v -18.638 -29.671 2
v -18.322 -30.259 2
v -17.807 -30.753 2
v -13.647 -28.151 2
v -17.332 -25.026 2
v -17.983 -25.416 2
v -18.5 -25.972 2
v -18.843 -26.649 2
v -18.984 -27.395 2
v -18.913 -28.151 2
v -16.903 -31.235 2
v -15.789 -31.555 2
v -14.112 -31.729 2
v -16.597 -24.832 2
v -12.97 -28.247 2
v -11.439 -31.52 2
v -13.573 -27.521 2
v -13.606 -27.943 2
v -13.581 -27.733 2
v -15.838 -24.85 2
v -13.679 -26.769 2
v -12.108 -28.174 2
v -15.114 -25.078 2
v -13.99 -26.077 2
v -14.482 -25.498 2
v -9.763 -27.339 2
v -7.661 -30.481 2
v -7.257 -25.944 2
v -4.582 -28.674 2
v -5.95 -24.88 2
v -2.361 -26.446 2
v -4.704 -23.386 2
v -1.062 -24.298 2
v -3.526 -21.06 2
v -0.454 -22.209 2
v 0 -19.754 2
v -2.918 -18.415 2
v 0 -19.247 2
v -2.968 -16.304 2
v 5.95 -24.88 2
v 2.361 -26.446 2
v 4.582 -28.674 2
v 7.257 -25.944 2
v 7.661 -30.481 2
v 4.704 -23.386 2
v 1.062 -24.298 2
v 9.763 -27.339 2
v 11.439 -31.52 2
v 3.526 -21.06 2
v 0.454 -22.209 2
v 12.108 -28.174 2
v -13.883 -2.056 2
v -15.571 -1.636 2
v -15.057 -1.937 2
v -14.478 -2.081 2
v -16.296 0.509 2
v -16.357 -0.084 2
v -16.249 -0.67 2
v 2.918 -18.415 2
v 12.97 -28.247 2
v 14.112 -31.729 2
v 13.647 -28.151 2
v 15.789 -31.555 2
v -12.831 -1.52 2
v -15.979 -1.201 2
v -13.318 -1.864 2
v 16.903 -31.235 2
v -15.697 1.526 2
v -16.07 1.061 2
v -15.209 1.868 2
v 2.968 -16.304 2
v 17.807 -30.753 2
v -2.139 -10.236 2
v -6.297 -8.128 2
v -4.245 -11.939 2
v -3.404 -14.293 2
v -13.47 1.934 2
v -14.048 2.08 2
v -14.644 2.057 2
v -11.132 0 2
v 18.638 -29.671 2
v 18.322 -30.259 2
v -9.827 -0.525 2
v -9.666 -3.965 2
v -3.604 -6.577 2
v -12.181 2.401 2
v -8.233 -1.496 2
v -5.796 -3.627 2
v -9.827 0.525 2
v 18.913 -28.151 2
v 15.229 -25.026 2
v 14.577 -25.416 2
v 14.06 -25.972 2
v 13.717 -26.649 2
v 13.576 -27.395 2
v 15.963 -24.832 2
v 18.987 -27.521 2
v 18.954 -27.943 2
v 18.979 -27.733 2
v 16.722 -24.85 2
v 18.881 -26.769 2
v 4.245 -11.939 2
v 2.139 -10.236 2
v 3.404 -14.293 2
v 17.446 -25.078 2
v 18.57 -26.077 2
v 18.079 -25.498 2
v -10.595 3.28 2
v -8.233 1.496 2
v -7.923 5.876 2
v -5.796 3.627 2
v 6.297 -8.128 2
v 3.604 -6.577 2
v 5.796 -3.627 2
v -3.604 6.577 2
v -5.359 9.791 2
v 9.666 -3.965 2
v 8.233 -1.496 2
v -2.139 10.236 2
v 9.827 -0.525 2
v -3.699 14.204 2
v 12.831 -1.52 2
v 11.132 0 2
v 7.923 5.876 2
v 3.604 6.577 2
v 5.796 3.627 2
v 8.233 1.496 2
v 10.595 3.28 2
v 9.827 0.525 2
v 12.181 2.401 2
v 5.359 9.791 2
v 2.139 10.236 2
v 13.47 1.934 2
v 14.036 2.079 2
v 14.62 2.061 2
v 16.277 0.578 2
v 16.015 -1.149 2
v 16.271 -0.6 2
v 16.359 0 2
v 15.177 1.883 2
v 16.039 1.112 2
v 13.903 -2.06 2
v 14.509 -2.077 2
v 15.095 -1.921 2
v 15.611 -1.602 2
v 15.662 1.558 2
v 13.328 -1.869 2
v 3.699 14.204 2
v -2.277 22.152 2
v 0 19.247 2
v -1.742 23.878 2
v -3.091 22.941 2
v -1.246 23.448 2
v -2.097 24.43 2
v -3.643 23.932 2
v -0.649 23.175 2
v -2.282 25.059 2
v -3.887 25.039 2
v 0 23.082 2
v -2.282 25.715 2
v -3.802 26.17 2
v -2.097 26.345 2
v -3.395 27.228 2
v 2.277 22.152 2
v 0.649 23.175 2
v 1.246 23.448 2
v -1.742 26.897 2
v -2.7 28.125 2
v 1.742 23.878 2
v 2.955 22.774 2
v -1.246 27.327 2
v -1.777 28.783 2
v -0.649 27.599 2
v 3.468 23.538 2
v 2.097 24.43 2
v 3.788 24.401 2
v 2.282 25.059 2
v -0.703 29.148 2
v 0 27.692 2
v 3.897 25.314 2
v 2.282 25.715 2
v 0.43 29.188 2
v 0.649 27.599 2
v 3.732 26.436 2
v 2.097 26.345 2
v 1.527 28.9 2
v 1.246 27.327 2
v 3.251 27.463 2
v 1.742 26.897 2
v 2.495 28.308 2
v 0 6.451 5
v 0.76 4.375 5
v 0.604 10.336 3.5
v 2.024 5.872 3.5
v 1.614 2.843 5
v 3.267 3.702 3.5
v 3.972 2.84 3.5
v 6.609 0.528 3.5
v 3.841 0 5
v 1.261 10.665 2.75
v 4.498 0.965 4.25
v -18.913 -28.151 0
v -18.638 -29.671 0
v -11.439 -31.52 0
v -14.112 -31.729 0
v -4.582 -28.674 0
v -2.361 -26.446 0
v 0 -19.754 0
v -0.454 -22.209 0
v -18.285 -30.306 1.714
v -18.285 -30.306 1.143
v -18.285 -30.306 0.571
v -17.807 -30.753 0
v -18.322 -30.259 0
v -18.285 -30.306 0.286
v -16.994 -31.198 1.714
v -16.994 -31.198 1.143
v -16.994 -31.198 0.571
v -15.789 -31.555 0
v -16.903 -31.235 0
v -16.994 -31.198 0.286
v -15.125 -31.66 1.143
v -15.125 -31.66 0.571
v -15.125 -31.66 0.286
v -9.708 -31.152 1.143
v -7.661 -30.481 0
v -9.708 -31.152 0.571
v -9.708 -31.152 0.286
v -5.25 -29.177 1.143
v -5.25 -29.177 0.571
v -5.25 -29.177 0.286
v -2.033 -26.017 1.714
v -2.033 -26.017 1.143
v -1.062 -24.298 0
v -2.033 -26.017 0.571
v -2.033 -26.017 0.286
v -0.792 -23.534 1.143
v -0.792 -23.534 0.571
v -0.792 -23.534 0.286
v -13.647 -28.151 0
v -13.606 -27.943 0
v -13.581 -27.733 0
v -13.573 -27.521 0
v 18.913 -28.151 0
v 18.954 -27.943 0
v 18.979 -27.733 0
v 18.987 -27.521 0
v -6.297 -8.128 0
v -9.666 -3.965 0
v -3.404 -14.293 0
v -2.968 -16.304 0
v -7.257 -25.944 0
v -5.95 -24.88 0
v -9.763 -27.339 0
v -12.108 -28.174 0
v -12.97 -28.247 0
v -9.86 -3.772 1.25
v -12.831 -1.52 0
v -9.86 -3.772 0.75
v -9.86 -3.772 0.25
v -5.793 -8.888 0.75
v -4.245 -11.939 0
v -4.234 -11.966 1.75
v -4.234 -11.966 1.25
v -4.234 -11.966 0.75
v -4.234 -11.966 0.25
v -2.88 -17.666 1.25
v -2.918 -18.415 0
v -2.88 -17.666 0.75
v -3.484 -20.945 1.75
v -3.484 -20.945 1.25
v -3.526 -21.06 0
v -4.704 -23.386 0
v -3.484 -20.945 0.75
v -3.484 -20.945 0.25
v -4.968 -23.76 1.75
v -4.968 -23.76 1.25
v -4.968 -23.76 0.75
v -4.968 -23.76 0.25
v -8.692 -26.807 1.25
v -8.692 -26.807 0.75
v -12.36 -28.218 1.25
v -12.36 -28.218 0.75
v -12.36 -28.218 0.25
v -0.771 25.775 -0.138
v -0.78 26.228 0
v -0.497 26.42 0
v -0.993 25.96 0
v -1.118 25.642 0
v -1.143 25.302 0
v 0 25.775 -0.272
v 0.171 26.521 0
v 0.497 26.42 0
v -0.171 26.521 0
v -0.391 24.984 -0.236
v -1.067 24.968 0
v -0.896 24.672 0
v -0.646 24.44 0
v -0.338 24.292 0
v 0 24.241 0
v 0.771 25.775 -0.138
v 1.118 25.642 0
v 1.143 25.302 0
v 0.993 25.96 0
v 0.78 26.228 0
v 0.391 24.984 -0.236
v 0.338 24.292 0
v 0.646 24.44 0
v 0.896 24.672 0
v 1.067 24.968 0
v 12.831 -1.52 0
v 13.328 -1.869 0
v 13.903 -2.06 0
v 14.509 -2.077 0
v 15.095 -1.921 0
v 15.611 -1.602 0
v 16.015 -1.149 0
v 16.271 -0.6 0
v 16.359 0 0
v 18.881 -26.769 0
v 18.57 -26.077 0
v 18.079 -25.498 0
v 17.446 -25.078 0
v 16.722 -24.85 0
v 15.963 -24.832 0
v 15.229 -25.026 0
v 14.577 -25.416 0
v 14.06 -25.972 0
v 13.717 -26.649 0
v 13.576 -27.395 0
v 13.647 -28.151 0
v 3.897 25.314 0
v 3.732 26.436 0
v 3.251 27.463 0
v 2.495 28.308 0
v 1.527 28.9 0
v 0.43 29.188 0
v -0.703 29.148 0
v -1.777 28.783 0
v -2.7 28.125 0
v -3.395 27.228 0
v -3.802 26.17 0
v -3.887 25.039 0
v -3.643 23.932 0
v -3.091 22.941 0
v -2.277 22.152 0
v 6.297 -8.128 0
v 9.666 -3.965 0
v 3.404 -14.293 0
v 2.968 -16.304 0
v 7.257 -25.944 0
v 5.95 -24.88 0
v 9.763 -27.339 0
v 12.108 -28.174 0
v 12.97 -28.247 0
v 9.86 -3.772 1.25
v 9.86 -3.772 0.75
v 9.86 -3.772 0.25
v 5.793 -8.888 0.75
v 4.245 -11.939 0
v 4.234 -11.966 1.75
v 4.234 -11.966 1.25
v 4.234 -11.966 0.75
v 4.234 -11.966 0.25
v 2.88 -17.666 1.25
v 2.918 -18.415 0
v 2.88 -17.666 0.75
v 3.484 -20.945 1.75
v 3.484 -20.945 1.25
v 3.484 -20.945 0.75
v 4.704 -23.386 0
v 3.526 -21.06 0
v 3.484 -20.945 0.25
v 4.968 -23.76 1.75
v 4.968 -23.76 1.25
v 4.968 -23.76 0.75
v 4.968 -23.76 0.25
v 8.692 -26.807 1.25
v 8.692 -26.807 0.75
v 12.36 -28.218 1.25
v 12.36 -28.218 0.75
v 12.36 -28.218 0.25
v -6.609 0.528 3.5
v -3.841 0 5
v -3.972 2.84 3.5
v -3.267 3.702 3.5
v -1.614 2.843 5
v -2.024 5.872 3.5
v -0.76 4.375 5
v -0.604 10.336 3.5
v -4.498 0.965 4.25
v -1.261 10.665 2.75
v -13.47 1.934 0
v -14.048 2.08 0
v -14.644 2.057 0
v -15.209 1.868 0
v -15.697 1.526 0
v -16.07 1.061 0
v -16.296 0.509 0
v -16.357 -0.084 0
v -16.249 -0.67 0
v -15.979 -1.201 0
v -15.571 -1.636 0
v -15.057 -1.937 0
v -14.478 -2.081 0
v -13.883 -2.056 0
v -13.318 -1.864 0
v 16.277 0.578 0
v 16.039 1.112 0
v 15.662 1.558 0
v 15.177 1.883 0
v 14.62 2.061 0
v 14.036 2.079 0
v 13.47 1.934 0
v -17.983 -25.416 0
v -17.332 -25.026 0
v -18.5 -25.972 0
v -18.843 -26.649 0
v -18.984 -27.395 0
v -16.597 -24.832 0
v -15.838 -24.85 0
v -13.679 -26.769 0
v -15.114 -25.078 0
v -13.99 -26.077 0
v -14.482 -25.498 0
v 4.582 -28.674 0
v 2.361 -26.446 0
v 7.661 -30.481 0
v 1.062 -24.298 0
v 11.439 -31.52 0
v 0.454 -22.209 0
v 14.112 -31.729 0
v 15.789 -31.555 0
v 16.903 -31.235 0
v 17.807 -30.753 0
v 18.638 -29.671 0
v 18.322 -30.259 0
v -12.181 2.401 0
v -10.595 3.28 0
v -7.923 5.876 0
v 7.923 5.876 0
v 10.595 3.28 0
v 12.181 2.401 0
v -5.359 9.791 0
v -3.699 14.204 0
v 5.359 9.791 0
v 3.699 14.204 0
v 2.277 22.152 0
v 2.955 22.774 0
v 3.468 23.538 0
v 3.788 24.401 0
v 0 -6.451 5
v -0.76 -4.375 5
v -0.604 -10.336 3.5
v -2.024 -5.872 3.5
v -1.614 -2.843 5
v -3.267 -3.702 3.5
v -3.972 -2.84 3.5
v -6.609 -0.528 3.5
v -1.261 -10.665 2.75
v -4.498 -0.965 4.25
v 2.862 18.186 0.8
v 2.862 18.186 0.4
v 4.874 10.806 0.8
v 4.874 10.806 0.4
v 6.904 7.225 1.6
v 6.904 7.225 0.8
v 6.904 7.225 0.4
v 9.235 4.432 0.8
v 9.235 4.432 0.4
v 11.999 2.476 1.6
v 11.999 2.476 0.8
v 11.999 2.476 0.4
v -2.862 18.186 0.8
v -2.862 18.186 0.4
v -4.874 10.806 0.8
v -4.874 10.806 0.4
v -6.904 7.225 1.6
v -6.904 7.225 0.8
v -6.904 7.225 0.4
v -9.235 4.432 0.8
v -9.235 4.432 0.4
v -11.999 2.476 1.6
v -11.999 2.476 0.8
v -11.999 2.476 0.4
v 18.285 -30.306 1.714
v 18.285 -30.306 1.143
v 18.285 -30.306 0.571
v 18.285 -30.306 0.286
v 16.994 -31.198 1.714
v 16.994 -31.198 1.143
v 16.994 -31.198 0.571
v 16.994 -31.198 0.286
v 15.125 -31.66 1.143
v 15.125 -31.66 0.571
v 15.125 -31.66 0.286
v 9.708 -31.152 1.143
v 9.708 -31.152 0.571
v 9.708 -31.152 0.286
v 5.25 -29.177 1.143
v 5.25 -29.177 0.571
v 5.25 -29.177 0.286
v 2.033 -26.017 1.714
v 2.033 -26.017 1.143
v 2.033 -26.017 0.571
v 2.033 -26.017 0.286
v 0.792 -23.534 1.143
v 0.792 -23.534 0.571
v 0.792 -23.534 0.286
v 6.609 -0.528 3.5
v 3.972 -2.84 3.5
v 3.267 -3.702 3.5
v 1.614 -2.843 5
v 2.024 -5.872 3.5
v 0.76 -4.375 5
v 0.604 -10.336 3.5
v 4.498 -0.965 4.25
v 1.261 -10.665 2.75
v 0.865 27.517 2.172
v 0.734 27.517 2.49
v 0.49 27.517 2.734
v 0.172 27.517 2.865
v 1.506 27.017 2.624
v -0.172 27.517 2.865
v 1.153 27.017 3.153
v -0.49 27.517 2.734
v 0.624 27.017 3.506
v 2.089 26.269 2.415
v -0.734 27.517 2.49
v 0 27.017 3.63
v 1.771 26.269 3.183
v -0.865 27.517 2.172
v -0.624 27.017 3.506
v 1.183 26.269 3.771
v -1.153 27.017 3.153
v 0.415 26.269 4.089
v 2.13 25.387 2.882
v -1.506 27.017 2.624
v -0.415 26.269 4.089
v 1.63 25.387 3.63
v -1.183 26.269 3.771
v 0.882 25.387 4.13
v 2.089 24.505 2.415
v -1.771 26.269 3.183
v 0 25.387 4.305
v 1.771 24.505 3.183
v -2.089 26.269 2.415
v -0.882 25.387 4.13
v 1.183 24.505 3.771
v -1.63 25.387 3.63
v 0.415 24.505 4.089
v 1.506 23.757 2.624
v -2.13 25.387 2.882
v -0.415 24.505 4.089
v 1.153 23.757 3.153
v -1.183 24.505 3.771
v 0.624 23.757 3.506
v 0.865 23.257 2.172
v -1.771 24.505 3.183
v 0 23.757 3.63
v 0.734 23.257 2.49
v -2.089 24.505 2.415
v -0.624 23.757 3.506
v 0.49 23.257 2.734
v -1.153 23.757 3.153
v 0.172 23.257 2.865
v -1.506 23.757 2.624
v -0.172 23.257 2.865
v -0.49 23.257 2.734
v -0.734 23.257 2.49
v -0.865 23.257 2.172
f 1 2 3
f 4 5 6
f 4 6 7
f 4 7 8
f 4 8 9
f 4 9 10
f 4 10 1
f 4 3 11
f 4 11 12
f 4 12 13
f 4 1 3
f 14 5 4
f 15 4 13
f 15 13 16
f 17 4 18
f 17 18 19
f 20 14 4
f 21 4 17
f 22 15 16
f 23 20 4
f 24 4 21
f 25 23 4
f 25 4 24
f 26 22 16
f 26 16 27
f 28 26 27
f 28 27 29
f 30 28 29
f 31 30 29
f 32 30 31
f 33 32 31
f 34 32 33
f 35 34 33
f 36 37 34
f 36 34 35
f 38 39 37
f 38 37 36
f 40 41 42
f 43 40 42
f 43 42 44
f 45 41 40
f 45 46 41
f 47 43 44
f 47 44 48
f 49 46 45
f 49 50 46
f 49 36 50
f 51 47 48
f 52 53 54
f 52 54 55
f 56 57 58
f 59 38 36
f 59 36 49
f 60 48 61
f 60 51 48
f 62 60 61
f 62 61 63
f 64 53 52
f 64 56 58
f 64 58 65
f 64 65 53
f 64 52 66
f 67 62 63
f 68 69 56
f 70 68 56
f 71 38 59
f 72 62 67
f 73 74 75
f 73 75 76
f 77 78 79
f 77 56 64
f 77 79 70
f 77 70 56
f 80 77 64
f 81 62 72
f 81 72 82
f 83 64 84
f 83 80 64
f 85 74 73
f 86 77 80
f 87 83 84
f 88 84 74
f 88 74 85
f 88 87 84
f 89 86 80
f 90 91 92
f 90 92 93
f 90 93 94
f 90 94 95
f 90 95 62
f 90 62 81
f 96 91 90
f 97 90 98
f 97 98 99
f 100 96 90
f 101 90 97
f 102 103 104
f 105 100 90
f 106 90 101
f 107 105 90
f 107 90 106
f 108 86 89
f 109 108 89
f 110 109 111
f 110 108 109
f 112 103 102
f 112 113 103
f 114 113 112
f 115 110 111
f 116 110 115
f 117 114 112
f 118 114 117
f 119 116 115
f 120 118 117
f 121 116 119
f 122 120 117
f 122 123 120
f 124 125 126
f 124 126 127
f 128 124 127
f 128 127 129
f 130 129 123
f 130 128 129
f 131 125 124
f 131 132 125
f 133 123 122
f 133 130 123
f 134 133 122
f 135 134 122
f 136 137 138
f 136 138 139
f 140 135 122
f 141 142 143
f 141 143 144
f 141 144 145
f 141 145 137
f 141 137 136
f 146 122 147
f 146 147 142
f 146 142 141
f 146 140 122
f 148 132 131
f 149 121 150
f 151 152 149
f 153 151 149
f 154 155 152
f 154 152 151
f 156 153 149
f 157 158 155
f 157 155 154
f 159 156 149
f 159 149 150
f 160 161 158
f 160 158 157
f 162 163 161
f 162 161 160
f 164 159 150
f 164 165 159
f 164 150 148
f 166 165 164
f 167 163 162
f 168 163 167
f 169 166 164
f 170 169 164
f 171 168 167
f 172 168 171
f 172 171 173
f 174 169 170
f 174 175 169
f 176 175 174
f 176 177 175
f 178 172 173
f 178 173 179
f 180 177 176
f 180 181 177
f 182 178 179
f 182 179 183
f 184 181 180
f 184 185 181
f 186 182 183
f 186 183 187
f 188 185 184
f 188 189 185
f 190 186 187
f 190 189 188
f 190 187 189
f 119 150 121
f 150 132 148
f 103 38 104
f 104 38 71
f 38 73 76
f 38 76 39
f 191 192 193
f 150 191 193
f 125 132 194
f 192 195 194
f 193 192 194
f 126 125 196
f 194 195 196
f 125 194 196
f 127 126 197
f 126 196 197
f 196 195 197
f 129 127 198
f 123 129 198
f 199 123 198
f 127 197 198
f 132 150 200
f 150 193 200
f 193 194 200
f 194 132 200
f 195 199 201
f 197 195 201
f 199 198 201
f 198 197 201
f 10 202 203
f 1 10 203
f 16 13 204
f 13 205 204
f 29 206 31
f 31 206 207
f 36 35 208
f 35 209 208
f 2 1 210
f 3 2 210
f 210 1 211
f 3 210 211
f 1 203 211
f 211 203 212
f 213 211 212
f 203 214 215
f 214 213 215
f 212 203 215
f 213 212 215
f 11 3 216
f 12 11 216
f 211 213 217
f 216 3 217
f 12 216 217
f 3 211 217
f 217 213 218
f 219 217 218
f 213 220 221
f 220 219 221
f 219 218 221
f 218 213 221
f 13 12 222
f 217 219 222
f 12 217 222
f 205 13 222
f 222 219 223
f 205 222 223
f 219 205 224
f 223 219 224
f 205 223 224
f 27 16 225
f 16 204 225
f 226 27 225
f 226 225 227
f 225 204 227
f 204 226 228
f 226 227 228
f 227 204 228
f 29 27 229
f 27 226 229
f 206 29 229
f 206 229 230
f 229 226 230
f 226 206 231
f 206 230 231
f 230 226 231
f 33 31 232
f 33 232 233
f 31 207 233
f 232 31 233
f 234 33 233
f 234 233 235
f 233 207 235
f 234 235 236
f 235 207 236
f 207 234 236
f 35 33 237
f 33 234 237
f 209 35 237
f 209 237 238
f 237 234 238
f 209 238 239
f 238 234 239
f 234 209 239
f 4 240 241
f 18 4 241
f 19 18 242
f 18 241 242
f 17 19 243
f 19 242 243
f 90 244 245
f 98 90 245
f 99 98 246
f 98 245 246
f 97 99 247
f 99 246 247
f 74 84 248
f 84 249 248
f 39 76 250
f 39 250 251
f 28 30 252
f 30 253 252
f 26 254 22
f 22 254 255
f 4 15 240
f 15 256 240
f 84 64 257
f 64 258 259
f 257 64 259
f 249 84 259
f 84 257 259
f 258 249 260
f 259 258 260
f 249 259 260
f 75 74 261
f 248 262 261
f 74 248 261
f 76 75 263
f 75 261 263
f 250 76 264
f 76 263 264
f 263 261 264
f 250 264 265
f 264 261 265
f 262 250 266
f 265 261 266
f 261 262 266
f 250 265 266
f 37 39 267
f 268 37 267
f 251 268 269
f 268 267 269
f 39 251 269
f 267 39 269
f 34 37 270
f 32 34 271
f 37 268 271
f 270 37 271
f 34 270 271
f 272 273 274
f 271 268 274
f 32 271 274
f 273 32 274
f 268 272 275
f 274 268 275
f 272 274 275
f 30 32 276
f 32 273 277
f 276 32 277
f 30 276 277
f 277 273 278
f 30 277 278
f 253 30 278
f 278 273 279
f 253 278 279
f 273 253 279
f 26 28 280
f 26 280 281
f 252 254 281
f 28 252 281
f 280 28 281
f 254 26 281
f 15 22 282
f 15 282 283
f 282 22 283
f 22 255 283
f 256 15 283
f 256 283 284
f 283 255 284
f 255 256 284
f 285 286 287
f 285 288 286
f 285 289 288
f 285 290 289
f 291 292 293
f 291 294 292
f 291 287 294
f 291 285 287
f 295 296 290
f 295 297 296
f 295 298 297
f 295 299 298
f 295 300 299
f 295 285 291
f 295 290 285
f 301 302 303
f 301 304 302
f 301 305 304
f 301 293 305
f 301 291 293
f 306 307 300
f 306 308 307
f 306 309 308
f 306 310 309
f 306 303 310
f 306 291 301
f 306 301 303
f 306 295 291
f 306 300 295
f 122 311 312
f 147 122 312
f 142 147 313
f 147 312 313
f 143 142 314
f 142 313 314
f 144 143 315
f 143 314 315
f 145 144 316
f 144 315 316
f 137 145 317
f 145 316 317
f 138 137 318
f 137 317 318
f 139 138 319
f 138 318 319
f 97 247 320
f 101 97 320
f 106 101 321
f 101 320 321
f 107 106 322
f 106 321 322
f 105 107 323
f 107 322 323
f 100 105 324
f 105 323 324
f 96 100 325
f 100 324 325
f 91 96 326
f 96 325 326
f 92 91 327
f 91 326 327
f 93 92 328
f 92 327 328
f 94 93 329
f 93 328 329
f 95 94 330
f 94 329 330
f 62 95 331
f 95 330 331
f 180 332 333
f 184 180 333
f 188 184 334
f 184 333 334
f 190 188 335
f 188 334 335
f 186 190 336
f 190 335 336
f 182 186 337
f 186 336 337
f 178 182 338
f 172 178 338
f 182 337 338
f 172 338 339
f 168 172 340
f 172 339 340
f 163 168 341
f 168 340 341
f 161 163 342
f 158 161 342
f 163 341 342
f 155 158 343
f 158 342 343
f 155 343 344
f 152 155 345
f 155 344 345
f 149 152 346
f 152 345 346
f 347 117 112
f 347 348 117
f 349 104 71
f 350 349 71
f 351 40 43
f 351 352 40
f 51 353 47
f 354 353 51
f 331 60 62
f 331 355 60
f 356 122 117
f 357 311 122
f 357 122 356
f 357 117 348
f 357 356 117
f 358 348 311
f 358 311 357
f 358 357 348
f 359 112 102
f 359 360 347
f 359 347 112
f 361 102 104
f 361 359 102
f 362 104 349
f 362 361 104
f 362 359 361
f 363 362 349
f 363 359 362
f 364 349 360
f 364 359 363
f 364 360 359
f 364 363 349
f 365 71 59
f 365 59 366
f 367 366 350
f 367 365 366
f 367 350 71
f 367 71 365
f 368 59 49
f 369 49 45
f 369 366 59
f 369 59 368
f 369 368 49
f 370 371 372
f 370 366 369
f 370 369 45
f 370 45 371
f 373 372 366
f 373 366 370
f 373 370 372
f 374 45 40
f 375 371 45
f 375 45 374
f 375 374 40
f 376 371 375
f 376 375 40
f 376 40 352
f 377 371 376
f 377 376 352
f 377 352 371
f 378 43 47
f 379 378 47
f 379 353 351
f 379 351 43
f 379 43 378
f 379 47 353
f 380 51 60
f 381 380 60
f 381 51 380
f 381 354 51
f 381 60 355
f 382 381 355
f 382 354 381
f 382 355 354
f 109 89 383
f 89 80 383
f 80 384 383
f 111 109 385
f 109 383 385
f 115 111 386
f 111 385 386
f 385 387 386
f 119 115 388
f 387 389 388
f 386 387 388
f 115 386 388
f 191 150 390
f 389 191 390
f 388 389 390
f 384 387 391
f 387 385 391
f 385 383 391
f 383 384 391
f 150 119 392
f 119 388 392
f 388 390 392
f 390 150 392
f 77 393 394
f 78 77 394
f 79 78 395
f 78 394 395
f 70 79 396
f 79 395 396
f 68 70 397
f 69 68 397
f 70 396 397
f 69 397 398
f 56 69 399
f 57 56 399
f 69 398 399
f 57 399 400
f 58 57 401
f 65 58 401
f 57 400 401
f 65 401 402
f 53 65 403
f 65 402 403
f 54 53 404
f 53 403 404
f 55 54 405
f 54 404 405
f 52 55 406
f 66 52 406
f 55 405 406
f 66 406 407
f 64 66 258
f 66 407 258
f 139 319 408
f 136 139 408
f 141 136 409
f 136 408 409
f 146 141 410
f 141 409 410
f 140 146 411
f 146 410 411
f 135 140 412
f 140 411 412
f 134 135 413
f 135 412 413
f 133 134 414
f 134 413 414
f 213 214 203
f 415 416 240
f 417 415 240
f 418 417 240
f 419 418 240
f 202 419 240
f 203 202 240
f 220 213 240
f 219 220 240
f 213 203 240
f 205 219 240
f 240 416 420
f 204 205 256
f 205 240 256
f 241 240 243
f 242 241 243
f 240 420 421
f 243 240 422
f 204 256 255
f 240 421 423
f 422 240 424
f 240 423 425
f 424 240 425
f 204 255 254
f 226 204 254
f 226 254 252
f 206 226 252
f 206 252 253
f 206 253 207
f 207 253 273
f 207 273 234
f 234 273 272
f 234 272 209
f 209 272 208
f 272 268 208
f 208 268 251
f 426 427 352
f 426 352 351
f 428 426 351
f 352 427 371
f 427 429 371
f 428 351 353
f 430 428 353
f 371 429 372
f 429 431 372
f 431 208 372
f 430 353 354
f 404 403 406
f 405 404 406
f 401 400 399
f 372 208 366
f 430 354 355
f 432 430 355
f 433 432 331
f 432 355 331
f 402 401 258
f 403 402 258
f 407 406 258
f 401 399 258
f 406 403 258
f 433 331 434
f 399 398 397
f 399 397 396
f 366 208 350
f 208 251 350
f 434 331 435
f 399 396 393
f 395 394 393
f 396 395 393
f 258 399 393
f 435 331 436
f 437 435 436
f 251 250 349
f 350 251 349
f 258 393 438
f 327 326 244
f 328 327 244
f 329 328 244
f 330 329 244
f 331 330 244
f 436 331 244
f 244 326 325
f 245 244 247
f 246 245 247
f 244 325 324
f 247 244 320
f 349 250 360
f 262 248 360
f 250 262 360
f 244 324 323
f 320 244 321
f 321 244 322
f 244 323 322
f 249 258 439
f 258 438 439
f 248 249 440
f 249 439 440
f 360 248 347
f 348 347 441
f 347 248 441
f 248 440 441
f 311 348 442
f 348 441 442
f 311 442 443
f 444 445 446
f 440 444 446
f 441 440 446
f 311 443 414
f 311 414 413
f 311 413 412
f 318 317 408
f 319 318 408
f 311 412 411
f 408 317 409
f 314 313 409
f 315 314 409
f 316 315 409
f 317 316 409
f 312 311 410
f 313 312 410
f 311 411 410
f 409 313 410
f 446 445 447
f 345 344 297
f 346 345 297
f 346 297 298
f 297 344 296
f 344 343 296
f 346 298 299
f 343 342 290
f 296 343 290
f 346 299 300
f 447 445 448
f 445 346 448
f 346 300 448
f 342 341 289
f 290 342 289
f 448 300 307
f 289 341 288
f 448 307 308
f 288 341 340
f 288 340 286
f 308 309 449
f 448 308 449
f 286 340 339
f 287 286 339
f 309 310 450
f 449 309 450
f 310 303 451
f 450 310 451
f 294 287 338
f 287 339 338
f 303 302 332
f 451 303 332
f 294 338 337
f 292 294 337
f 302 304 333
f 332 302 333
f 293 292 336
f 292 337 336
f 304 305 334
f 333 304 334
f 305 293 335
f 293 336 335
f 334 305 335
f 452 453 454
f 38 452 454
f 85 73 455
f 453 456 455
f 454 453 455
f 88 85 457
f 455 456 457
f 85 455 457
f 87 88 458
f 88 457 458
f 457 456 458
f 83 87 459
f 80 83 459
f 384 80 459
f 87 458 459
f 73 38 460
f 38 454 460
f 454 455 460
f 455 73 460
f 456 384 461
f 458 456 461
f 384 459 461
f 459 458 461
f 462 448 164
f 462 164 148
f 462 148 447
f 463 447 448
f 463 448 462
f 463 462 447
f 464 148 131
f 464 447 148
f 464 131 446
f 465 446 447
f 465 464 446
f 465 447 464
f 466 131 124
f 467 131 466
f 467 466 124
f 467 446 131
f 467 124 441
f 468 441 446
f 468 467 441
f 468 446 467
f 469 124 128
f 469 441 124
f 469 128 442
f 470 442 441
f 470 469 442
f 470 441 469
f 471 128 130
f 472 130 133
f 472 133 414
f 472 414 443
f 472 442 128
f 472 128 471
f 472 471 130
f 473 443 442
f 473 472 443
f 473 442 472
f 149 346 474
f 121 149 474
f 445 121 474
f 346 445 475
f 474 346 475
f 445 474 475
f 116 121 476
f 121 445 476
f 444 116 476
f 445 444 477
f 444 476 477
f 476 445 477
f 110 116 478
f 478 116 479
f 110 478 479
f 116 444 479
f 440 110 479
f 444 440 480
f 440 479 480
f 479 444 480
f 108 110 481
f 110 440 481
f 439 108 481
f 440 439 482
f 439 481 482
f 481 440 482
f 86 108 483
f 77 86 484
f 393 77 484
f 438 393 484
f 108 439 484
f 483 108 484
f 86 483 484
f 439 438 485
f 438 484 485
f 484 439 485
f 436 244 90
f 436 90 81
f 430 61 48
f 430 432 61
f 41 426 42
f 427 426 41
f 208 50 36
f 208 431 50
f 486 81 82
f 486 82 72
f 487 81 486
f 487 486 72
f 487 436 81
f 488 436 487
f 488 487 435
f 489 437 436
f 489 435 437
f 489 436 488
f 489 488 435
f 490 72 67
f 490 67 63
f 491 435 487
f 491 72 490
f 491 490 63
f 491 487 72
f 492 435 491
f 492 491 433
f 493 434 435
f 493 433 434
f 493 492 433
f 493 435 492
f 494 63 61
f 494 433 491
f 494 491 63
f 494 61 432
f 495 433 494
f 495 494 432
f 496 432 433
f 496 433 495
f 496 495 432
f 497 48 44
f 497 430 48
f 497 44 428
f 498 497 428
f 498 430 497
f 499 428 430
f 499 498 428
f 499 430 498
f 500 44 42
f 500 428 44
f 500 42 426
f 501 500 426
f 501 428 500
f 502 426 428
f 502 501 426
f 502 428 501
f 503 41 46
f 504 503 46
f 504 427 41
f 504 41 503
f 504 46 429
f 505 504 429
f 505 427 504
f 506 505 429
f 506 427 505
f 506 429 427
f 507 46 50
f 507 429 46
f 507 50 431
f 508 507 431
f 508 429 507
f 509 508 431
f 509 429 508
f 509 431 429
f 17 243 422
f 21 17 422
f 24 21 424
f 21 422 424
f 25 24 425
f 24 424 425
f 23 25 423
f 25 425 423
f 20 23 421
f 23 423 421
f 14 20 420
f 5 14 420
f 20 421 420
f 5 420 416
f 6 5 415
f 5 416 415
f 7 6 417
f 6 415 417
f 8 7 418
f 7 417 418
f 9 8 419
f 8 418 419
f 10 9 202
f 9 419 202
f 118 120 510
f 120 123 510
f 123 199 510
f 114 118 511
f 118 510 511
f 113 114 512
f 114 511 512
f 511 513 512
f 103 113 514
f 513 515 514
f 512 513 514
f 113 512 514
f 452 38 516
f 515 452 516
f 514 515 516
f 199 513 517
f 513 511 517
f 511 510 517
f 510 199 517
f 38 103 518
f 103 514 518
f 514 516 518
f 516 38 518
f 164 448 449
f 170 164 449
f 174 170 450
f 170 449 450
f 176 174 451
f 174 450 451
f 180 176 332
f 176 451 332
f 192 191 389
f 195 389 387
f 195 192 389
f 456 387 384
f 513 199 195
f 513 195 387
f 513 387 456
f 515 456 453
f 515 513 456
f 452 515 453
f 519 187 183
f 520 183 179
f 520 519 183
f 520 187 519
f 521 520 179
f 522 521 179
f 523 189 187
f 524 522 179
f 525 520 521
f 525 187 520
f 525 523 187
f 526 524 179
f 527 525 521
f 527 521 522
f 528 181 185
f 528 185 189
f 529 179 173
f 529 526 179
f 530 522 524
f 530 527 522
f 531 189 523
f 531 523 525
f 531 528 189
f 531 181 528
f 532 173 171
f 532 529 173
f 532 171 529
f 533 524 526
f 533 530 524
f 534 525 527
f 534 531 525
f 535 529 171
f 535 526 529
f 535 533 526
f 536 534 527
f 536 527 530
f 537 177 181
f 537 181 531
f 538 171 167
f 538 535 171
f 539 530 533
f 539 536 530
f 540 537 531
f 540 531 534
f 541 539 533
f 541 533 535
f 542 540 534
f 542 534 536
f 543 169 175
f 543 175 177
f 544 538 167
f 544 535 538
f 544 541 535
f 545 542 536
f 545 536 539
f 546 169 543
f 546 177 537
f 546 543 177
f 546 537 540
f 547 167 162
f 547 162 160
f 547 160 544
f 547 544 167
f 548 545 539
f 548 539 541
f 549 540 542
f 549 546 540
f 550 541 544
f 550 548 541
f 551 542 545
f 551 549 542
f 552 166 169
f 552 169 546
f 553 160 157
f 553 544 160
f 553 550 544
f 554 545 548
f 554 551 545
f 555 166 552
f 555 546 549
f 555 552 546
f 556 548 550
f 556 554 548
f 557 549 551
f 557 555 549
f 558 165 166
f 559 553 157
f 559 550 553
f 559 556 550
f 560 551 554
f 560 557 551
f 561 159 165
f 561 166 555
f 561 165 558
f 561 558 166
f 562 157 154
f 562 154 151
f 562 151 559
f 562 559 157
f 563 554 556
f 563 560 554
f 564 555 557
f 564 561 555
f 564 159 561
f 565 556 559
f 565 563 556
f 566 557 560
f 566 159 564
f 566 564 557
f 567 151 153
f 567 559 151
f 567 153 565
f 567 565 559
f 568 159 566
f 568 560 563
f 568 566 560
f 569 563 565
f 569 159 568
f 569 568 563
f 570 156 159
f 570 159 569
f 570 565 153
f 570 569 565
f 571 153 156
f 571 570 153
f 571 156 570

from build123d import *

# Parameters (mm, degrees)
F1_DEPTH = 2


with BuildPart() as f1:
    # F0 (on Top) → F1 (new body)
    with BuildSketch(Plane.XY):
        with BuildLine():
            ThreePointArc((2.276998472, 22.1518947859), (3.4684353098, 23.5377967667), (3.8970014846, 25.3144726157))
            ThreePointArc((3.8970014846, 25.3144726157), (-1.776675849, 28.7829079255), (-2.276998472, 22.1518947859))
            ThreePointArc((-2.276998472, 22.1518947859), (0, 21.4174711311), (2.276998472, 22.1518947859))
        make_face()
        with BuildLine():
            ThreePointArc((2.276998472, 22.1518947859), (0, 21.4174711311), (-2.276998472, 22.1518947859))
            add(Edge.make_bspline(
                [(-2.276998472, 22.1518947859), (-2.43209236, 20.9439660702), (-2.8343734971, 18.0367414787), (-4.2933644234, 10.5944689547), (-8.8445045466, 4.3730220087), (-11.8033781804, 2.4111709095), (-13.0773430388, 2.1147085966), (-13.4704228381, 1.9336606815)],
                knots=[0, 0, 0, 0, 0.1881889821, 0.4481491748, 0.7093502782, 0.8822992894, 1, 1, 1, 1], degree=3))
            ThreePointArc((-13.4704228381, 1.9336606815), (-12.5293900739, 1.1634963246), (-12.1758761383, 0))
            ThreePointArc((-12.1758761383, 0), (-12.3466918638, -0.827839696), (-12.831236523, -1.520452898))
            add(Edge.make_bspline(
                [(-12.831236523, -1.520452898), (-11.8842823807, -2.1213598077), (-9.681883743, -3.5201856027), (-5.5850911002, -8.9136286048), (-4.2143400839, -11.8630451312), (-2.0601001418, -17.7294924846), (-4.5364296122, -24.1123047819), (-8.3995913538, -26.8506466614), (-12.2431889954, -28.4193492404), (-13.2719842293, -28.2231302019), (-13.6472955259, -28.1513297683)],
                knots=[0, 0, 0, 0, 0.116209539, 0.2700802769, 0.3818783209, 0.5275533776, 0.680317664, 0.8123481439, 0.9316634476, 1, 1, 1, 1], degree=3))
            ThreePointArc((-13.6472955259, -28.1513297683), (-16.2800811231, -30.2281833728), (-18.9128667203, -28.1513297683))
            add(Edge.make_bspline(
                [(-18.9128667203, -28.1513297683), (-18.8376863203, -28.9308803678), (-18.6694510212, -30.675323445), (-14.9675114924, -32.0694588166), (-9.6030872532, -31.3634199504), (-5.1754016498, -29.5295339957), (-1.8867493119, -26.1259118959), (-0.6530666103, -23.5893108184), (-0.2293292758, -21.1004769068), (0, -19.7535045445)],
                knots=[0, 0, 0, 0, 0.1097624217, 0.2456213834, 0.4165331309, 0.578325558, 0.7339136873, 0.8559924358, 1, 1, 1, 1], degree=3))
            add(Edge.make_bspline(
                [(18.9128667203, -28.1513297683), (18.8376863203, -28.9308803678), (18.6694510212, -30.675323445), (14.9675114924, -32.0694588166), (9.6030872532, -31.3634199504), (5.1754016498, -29.5295339957), (1.8867493119, -26.1259118959), (0.6530666103, -23.5893108184), (0.2293292758, -21.1004769068), (0, -19.7535045445)],
                knots=[0, 0, 0, 0, 0.1097624217, 0.2456213834, 0.4165331309, 0.578325558, 0.7339136873, 0.8559924358, 1, 1, 1, 1], degree=3))
            ThreePointArc((18.9128667203, -28.1513297683), (16.2800811231, -30.2281833728), (13.6472955259, -28.1513297683))
            add(Edge.make_bspline(
                [(12.831236523, -1.520452898), (11.8842823807, -2.1213598077), (9.681883743, -3.5201856027), (5.5850911002, -8.9136286048), (4.2143400839, -11.8630451312), (2.0601001418, -17.7294924846), (4.5364296122, -24.1123047819), (8.3995913538, -26.8506466614), (12.2431889954, -28.4193492404), (13.2719842293, -28.2231302019), (13.6472955259, -28.1513297683)],
                knots=[0, 0, 0, 0, 0.116209539, 0.2700802769, 0.3818783209, 0.5275533776, 0.680317664, 0.8123481439, 0.9316634476, 1, 1, 1, 1], degree=3))
            ThreePointArc((12.831236523, -1.520452898), (12.2107910898, 0.3805587398), (13.4704228381, 1.9336606815))
            add(Edge.make_bspline(
                [(2.276998472, 22.1518947859), (2.43209236, 20.9439660702), (2.8343734971, 18.0367414787), (4.2933644234, 10.5944689547), (8.8445045466, 4.3730220087), (11.8033781804, 2.4111709095), (13.0773430388, 2.1147085966), (13.4704228381, 1.9336606815)],
                knots=[0, 0, 0, 0, 0.1881889821, 0.4481491748, 0.7093502782, 0.8822992894, 1, 1, 1, 1], degree=3))
        make_face()
        with BuildLine():
            ThreePointArc((-12.1758761383, 0), (-12.5293900739, 1.1634963246), (-13.4704228381, 1.9336606815))
            ThreePointArc((-13.4704228381, 1.9336606815), (-16.3238112841, -0.3805587398), (-12.831236523, -1.520452898))
            ThreePointArc((-12.831236523, -1.520452898), (-12.3466918638, -0.827839696), (-12.1758761383, 0))
        make_face()
        with BuildLine():
            ThreePointArc((16.3587262356, 0), (15.4307975115, 1.737911113), (13.4704228381, 1.9336606815))
            ThreePointArc((13.4704228381, 1.9336606815), (12.2107910898, 0.3805587398), (12.831236523, -1.520452898))
            ThreePointArc((12.831236523, -1.520452898), (15.0951408829, -1.9206093231), (16.3587262356, 0))
        make_face()
        with BuildLine():
            ThreePointArc((-18.9128667203, -28.1513297683), (-16.2800811231, -30.2281833728), (-13.6472955259, -28.1513297683))
            ThreePointArc((-13.6472955259, -28.1513297683), (-13.5915554401, -27.8383489621), (-13.5728896121, -27.5209918618))
            ThreePointArc((-13.5728896121, -27.5209918618), (-16.5974382234, -24.8324661788), (-18.9128667203, -28.1513297683))
        make_face()
        with BuildLine():
            ThreePointArc((18.9872726341, -27.5209918618), (15.9627240228, -24.8324661788), (13.6472955259, -28.1513297683))
            ThreePointArc((13.6472955259, -28.1513297683), (16.2800811231, -30.2281833728), (18.9128667203, -28.1513297683))
            ThreePointArc((18.9128667203, -28.1513297683), (18.9686068061, -27.8383489621), (18.9872726341, -27.5209918618))
        make_face()
    extrude(amount=F1_DEPTH)

    # F2 (on face) → F5 section 0
    with BuildSketch(Plane.XY.offset(2)):
        with BuildLine():
            add(Edge.make_bspline(
                [(0, 19.2468184978), (0.6301650981, 16.2510379584), (1.7928287138, 10.723780032), (4.0098790345, 4.9325918727), (8.7986333903, 0.8351177225), (10.4822360359, 0.2324566501), (11.1316302791, 0)],
                knots=[0, 0, 0, 0, 0.3137777977, 0.578924523, 0.8375840098, 1, 1, 1, 1], degree=3))
            add(Edge.make_bspline(
                [(0, 19.2468184978), (-0.6301650981, 16.2510379584), (-1.7928287138, 10.723780032), (-4.0098790345, 4.9325918727), (-8.7986333903, 0.8351177225), (-10.4822360359, 0.2324566501), (-11.1316302791, 0)],
                knots=[0, 0, 0, 0, 0.3137777977, 0.578924523, 0.8375840098, 1, 1, 1, 1], degree=3))
            add(Edge.make_bspline(
                [(0, -19.2468184978), (-0.6301650981, -16.2510379584), (-1.7928287138, -10.723780032), (-4.0098790345, -4.9325918727), (-8.7986333903, -0.8351177225), (-10.4822360359, -0.2324566501), (-11.1316302791, 0)],
                knots=[0, 0, 0, 0, 0.3137777977, 0.578924523, 0.8375840098, 1, 1, 1, 1], degree=3))
            add(Edge.make_bspline(
                [(0, -19.2468184978), (0.6301650981, -16.2510379584), (1.7928287138, -10.723780032), (4.0098790345, -4.9325918727), (8.7986333903, -0.8351177225), (10.4822360359, -0.2324566501), (11.1316302791, 0)],
                knots=[0, 0, 0, 0, 0.3137777977, 0.578924523, 0.8375840098, 1, 1, 1, 1], degree=3))
        make_face()
    # F4 (on offset) → F5 section 1
    with BuildSketch(Plane.XY.offset(5)):
        with BuildLine():
            add(Edge.make_bspline(
                [(0, 6.4514661208), (0.2840723178, 5.5826456273), (0.851655844, 3.8467207648), (2.4773384631, 1.6062376793), (3.4071339479, 0.5107520935), (3.8406357635, 0)],
                knots=[0, 0, 0, 0, 0.3484590253, 0.6962297623, 1, 1, 1, 1], degree=3))
            add(Edge.make_bspline(
                [(0, 6.4514661208), (-0.2840723178, 5.5826456273), (-0.851655844, 3.8467207648), (-2.4773384631, 1.6062376793), (-3.4071339479, 0.5107520935), (-3.8406357635, 0)],
                knots=[0, 0, 0, 0, 0.3484590253, 0.6962297623, 1, 1, 1, 1], degree=3))
            add(Edge.make_bspline(
                [(0, -6.4514661208), (-0.2840723178, -5.5826456273), (-0.851655844, -3.8467207648), (-2.4773384631, -1.6062376793), (-3.4071339479, -0.5107520935), (-3.8406357635, 0)],
                knots=[0, 0, 0, 0, 0.3484590253, 0.6962297623, 1, 1, 1, 1], degree=3))
            add(Edge.make_bspline(
                [(0, -6.4514661208), (0.2840723178, -5.5826456273), (0.851655844, -3.8467207648), (2.4773384631, -1.6062376793), (3.4071339479, -0.5107520935), (3.8406357635, 0)],
                knots=[0, 0, 0, 0, 0.3484590253, 0.6962297623, 1, 1, 1, 1], degree=3))
        make_face()
    loft()

    # F6 (on face) → F7 (revolve)
    with BuildSketch(Plane.XY.offset(2)):
        with BuildLine():
            Line((0, 23.0819760401), (0, 27.6924492281))
            ThreePointArc((0, 27.6924492281), (-2.305236594, 25.3872126341), (0, 23.0819760401))
        make_face()
    revolve(axis=Axis((0, 25.3872126341, 2), (0, -1, 0)))


solid = f1.part
